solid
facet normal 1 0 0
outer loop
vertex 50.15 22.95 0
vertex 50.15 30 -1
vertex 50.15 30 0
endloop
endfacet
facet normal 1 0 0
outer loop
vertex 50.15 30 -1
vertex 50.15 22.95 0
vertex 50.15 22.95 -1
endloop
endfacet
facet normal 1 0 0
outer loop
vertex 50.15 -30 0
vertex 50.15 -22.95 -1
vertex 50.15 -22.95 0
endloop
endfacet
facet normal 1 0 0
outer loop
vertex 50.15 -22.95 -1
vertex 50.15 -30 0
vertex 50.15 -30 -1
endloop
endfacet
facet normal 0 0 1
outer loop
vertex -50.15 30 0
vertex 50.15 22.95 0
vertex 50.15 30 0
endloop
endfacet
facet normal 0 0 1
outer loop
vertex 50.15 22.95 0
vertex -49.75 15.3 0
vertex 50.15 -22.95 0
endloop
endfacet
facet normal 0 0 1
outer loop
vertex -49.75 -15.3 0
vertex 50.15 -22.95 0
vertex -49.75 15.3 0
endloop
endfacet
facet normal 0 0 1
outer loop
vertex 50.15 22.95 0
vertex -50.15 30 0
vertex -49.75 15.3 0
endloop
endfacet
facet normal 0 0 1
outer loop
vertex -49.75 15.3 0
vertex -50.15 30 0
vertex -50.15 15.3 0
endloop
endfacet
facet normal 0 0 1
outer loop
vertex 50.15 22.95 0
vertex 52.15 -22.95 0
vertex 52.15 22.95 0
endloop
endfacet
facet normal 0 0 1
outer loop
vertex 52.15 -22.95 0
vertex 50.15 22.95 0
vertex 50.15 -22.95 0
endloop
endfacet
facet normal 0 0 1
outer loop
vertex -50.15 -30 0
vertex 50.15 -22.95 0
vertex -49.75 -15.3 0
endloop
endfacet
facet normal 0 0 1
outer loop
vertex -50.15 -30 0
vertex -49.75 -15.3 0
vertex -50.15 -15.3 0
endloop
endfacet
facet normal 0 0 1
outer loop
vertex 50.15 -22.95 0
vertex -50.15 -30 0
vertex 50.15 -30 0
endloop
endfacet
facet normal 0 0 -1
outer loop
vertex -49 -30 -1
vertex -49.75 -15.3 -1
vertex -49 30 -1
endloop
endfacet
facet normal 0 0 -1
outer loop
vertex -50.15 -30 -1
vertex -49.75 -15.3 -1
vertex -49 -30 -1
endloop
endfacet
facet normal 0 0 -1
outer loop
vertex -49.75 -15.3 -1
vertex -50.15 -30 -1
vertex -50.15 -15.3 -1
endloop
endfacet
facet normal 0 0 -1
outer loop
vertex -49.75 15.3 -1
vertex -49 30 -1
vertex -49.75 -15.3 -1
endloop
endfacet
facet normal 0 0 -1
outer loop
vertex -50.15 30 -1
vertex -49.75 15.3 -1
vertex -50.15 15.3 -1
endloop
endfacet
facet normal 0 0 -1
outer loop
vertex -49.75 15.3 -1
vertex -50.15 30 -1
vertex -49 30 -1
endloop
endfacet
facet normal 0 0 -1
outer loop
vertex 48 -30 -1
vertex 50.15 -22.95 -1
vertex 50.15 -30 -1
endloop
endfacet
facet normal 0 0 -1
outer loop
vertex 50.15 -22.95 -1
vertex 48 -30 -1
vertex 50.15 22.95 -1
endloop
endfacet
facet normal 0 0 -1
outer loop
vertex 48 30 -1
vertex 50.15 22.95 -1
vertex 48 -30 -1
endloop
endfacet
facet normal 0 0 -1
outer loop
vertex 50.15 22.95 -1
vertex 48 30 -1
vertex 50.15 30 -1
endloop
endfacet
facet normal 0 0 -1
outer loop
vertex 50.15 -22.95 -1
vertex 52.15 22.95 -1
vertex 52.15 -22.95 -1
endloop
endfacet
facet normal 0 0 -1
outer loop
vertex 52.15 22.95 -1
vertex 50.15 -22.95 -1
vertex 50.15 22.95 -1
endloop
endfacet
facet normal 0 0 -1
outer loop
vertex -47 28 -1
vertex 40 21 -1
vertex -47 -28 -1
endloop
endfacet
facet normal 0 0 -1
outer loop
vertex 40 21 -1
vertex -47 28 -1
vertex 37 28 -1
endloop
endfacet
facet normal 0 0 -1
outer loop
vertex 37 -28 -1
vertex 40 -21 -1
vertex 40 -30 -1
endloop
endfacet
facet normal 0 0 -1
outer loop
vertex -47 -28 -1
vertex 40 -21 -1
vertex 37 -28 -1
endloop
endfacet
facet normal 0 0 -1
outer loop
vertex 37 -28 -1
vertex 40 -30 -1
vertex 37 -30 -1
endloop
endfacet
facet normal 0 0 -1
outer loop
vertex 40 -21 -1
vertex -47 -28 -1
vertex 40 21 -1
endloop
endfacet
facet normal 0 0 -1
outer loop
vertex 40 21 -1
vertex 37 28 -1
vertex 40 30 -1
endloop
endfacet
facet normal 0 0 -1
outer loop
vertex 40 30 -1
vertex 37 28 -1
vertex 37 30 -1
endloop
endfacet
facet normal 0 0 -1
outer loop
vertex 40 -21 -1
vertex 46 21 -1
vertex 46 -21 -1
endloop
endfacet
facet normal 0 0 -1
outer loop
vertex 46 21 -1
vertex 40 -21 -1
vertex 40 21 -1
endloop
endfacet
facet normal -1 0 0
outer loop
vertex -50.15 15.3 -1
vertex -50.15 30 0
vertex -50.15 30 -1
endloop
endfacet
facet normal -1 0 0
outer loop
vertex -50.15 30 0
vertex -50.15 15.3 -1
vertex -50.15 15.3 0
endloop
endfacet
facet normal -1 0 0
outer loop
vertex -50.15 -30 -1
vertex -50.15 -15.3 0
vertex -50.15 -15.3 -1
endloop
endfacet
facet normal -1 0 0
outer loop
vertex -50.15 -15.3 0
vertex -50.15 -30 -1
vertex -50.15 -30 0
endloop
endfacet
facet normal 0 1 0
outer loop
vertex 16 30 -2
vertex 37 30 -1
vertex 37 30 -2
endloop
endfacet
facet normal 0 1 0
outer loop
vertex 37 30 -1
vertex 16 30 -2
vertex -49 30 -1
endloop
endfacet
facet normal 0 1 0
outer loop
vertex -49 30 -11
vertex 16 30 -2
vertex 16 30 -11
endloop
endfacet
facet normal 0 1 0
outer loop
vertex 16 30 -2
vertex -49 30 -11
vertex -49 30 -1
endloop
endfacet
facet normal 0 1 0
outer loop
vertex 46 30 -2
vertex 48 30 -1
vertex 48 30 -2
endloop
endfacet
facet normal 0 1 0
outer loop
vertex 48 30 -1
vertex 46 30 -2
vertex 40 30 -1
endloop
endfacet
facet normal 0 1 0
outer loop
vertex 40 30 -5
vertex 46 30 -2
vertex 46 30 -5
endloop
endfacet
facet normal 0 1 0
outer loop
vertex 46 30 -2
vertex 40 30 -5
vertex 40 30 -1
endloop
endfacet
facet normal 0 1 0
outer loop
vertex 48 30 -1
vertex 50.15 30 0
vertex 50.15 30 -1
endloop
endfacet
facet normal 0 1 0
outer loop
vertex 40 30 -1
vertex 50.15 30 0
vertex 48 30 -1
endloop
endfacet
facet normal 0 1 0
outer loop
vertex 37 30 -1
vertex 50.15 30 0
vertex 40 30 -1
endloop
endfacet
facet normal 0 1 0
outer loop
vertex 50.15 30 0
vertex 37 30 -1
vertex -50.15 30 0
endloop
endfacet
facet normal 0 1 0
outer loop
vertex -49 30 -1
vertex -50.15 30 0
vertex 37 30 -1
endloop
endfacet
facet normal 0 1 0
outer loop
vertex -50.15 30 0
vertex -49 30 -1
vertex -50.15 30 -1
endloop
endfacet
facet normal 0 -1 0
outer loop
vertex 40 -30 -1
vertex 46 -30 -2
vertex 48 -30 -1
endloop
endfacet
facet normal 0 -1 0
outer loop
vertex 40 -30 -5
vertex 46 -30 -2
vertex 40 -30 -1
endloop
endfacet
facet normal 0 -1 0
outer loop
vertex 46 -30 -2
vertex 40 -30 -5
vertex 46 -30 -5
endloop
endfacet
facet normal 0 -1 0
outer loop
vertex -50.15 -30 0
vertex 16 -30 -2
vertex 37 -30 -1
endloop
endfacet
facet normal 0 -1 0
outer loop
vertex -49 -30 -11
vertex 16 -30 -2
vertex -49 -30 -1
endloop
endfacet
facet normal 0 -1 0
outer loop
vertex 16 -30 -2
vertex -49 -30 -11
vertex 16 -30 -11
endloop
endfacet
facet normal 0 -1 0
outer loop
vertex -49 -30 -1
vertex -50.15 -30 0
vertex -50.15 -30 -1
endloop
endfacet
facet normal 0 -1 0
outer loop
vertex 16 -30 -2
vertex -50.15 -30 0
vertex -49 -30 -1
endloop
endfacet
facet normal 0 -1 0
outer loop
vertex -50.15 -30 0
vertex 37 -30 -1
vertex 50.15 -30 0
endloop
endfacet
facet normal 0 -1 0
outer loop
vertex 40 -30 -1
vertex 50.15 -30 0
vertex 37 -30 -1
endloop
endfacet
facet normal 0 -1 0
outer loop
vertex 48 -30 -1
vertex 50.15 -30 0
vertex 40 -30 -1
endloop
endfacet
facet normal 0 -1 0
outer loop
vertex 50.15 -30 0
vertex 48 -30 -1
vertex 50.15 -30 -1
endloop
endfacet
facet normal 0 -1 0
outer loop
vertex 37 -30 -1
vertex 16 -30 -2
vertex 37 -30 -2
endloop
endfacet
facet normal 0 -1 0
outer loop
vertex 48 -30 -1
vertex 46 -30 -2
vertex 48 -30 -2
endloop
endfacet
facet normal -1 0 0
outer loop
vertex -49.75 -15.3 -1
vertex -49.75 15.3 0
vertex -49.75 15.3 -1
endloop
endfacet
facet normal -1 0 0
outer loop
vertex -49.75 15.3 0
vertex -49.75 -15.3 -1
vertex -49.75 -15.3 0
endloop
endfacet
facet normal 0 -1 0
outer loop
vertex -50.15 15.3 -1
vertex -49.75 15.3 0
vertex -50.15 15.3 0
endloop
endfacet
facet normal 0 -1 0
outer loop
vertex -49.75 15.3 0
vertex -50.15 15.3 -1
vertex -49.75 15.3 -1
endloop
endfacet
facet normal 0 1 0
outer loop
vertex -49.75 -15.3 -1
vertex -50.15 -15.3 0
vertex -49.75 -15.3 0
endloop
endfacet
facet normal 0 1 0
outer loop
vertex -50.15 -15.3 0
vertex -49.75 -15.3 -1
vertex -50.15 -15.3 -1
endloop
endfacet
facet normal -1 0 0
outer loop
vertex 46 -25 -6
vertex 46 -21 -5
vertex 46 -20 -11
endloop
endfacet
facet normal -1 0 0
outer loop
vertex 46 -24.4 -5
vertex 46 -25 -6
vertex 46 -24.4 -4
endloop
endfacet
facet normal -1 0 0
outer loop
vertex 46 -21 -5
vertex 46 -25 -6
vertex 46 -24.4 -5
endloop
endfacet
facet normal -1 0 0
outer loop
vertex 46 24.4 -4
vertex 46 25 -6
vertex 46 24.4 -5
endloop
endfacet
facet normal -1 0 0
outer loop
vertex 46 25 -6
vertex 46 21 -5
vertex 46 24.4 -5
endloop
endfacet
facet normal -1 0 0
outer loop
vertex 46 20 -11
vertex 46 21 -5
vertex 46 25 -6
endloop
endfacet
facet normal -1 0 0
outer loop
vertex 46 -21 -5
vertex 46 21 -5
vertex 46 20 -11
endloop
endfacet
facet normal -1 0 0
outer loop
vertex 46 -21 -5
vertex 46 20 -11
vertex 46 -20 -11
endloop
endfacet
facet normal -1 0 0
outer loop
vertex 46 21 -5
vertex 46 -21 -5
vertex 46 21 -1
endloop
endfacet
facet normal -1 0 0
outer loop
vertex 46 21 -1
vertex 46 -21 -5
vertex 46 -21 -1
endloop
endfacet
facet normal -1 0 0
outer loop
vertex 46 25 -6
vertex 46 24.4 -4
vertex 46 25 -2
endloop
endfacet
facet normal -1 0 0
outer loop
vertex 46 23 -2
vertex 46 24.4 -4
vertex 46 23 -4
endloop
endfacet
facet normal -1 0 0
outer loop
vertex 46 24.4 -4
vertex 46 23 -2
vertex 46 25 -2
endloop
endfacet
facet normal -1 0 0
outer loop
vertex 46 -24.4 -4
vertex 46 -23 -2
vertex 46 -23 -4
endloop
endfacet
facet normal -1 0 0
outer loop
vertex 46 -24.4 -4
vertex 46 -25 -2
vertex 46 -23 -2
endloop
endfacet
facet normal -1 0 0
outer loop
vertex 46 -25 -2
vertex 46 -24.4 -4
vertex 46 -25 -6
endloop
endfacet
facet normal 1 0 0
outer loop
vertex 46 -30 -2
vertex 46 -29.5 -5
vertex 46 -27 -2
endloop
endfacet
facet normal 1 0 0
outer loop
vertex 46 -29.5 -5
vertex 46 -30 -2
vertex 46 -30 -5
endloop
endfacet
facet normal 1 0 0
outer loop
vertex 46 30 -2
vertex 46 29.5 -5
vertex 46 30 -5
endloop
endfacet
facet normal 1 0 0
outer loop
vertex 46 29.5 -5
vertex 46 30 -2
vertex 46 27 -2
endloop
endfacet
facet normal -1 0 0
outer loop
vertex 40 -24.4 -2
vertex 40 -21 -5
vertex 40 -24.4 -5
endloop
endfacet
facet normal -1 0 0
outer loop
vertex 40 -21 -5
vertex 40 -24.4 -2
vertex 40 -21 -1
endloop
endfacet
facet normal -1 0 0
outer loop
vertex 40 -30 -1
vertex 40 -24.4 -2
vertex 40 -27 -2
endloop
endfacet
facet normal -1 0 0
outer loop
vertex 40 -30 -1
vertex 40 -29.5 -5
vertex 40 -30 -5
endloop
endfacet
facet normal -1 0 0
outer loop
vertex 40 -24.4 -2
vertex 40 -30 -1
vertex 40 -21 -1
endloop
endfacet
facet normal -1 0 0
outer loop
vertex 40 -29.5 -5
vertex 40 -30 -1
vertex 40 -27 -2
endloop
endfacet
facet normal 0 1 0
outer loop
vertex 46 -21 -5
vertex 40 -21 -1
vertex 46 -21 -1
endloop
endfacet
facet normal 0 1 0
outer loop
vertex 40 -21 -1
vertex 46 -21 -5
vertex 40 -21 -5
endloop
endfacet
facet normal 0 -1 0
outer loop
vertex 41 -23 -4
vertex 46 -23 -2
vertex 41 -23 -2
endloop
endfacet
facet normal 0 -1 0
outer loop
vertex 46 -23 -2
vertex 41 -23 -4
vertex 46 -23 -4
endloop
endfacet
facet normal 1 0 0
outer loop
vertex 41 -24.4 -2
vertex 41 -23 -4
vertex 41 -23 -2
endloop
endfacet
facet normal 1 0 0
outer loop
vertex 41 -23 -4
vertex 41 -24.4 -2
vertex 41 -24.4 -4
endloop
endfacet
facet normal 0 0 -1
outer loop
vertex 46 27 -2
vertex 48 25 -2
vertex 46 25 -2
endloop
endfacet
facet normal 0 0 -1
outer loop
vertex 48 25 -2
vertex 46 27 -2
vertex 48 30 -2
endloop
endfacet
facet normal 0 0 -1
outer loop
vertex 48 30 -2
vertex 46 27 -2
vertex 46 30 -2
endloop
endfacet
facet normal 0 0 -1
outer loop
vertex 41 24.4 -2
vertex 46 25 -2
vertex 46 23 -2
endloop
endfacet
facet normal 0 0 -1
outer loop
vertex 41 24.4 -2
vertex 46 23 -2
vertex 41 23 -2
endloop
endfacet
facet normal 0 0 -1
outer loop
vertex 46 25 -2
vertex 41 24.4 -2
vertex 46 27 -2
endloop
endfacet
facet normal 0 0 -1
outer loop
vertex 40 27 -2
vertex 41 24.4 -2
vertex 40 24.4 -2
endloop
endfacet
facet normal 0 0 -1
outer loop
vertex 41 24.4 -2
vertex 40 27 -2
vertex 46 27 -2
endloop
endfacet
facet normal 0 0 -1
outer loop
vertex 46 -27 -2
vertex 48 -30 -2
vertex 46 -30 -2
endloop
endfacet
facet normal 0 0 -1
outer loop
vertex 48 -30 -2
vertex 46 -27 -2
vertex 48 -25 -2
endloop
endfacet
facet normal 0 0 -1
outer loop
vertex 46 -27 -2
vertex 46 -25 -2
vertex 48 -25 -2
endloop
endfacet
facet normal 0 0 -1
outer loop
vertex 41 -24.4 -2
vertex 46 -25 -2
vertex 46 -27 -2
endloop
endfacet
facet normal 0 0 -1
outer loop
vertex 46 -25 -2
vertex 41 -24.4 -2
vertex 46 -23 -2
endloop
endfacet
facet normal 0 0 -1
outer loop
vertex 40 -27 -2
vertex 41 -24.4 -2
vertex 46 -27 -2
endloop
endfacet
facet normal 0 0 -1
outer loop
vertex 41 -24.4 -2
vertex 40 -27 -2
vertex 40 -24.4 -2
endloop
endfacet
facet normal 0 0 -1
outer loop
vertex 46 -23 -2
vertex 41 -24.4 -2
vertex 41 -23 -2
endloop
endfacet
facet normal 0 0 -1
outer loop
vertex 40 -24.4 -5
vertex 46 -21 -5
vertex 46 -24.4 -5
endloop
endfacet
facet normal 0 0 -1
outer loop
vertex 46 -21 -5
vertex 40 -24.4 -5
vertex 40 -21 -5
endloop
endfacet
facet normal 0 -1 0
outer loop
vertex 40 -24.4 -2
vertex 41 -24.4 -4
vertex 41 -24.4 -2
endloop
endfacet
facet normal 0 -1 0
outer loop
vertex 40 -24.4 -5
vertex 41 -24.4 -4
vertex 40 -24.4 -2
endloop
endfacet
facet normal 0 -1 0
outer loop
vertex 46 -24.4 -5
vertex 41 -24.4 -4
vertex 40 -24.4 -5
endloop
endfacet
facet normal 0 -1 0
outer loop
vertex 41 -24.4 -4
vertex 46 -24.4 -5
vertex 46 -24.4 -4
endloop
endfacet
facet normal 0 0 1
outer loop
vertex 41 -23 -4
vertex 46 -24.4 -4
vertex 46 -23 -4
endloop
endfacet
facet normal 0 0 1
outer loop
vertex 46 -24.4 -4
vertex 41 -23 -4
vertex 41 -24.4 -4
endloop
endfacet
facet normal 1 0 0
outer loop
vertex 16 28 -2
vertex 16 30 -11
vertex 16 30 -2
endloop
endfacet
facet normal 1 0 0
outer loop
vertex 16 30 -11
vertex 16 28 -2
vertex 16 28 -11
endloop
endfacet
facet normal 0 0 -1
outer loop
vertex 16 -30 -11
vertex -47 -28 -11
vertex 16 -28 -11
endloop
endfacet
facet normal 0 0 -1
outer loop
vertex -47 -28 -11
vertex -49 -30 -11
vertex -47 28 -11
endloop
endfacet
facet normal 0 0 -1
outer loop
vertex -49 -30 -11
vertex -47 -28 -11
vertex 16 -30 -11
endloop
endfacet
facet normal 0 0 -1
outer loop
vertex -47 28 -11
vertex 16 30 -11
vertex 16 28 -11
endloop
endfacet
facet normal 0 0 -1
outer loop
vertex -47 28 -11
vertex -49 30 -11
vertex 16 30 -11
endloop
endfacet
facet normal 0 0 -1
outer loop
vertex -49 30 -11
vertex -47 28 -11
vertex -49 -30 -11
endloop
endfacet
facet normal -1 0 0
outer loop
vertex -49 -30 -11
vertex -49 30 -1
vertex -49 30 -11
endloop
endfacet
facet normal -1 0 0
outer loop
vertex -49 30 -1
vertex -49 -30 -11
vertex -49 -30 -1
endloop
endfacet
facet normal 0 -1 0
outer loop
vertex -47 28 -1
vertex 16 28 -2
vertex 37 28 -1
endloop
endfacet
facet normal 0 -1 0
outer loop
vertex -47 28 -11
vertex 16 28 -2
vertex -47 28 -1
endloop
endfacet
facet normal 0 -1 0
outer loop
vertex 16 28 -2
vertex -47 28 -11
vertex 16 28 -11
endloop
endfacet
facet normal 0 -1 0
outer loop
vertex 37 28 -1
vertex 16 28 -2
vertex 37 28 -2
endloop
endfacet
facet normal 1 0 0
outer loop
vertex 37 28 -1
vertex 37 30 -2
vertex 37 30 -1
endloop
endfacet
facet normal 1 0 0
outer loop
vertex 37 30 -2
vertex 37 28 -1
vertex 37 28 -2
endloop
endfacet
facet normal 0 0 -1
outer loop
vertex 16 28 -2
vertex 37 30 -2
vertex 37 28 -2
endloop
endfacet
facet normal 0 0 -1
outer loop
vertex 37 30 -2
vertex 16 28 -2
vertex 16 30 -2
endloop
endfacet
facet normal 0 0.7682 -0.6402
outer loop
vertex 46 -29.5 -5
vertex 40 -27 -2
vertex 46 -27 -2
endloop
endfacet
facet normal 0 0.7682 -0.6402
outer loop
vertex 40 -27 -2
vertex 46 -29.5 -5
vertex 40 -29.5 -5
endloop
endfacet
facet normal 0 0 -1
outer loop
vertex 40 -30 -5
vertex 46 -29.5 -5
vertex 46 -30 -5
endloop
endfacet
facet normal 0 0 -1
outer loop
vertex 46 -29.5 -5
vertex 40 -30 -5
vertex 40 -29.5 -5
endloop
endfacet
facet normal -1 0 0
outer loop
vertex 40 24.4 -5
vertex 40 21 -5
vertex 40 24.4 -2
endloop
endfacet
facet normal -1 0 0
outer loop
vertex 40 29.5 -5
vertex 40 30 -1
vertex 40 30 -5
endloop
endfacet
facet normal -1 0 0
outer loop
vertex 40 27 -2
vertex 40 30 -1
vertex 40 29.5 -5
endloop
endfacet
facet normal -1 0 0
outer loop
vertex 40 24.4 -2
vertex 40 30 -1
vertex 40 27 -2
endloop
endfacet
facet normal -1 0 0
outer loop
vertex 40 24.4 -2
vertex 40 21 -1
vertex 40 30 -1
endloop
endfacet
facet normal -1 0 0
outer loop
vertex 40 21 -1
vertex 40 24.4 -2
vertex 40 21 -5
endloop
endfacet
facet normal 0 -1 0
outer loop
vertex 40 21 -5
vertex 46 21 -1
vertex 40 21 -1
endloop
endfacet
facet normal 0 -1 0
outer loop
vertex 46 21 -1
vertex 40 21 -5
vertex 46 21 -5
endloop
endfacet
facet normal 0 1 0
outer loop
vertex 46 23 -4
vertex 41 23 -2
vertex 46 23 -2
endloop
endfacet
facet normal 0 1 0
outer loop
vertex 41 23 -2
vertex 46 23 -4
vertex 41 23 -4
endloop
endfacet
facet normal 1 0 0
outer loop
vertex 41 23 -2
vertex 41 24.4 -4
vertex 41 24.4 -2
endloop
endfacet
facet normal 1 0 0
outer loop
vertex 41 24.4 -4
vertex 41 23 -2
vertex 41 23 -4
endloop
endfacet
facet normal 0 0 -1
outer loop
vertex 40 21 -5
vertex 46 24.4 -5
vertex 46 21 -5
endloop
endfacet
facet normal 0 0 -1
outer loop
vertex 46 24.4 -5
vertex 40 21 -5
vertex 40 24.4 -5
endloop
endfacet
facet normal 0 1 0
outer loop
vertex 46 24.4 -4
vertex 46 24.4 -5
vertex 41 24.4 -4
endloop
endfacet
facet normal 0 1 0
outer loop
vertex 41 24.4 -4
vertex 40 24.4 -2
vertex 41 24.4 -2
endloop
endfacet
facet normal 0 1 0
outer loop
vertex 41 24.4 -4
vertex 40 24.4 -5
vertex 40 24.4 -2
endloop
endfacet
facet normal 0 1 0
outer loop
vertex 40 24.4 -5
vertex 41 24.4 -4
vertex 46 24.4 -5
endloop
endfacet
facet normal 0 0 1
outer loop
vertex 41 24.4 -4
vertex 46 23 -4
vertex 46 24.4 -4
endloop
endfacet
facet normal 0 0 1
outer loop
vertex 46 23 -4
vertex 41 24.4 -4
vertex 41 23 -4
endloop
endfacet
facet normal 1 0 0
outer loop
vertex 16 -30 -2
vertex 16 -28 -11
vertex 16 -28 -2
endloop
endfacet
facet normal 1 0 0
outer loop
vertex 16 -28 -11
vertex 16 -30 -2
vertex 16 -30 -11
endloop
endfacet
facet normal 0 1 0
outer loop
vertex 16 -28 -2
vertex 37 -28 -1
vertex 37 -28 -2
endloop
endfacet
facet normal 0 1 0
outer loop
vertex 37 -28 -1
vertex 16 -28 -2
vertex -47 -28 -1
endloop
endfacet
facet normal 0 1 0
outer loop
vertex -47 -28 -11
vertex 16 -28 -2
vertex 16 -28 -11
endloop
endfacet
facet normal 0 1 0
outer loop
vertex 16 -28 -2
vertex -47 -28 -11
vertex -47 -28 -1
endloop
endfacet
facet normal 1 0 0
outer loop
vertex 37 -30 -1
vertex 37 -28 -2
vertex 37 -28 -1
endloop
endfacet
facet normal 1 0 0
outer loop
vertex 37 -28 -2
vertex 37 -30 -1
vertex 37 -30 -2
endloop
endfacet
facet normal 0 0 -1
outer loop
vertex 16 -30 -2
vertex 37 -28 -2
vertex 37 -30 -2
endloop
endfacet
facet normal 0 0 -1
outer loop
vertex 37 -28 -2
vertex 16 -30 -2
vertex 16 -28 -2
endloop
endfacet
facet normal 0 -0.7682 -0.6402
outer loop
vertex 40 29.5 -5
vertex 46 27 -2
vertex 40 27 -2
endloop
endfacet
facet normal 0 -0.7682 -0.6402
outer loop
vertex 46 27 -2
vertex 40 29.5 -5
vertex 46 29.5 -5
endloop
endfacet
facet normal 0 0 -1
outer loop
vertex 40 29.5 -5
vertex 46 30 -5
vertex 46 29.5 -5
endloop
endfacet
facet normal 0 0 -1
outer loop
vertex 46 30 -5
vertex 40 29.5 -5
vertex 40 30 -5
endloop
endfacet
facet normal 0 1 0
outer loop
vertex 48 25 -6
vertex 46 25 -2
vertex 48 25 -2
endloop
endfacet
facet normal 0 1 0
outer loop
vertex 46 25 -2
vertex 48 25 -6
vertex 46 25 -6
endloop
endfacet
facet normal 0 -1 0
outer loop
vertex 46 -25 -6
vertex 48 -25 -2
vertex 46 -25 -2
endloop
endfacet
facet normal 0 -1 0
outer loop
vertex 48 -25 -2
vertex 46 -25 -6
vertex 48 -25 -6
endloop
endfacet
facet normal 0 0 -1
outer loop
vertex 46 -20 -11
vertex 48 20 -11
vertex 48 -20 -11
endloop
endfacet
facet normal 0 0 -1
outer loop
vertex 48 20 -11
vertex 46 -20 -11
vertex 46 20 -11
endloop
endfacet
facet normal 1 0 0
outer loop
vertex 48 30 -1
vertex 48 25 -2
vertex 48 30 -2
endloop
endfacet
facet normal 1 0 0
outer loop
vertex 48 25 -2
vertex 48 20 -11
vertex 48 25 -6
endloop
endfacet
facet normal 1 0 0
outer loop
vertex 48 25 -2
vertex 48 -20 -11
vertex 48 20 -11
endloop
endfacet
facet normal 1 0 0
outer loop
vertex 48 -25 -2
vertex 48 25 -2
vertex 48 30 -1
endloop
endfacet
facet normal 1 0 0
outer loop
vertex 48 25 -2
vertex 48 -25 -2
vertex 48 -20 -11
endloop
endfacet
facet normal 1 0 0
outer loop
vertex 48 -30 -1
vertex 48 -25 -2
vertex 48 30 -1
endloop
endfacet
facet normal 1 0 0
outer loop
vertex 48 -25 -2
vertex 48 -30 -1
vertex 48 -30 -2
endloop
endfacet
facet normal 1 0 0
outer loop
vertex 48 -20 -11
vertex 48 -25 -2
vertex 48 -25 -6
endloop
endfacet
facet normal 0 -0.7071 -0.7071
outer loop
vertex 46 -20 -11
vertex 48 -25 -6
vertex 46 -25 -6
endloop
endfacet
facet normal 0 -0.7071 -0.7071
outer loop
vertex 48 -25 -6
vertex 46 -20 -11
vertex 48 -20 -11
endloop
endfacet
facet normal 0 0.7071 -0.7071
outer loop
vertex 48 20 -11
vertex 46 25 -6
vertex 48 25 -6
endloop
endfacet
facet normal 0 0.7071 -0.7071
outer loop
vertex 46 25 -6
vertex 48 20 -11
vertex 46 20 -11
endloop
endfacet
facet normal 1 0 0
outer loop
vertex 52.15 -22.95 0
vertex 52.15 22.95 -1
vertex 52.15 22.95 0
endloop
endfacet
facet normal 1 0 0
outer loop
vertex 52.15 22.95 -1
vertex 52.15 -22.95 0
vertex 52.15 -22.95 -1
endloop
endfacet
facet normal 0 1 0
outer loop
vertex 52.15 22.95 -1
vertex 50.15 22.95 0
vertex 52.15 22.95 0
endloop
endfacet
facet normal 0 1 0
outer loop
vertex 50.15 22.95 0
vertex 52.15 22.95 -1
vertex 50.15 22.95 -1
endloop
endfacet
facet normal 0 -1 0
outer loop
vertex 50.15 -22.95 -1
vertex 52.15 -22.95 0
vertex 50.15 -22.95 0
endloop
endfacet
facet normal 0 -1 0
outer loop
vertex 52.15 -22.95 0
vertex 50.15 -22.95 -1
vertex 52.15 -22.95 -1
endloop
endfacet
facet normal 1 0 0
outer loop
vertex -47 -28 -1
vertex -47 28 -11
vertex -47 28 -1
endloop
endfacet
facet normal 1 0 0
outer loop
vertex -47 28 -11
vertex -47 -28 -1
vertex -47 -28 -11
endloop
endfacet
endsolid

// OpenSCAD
module hidden_box_cup(payload) {
    difference() {
        translate([0, 0, -0.5])
        cube([payload.x + 0.3, payload.y, 1], true);
        
        translate([-payload.x / 2 - 0.5, 0, -1])
        cube([1.5, payload.y - 29.4, 3], true);
    }
    
    translate([payload.x / 2 - 2, 0, -2])
    rotate([-90, 0, 90])
    linear_extrude(2)
    polygon([
        [-payload.y / 2 + 5, 0], 
        [-payload.y / 2 + 5, 4],
        [-payload.y / 2 + 10, 9],
        [payload.y / 2 - 10, 9],
        [payload.y / 2 - 5, 4],
        [payload.y / 2 - 5, 0],
    ]);
        
    translate([payload.x / 2 - 3, 0, -1])
    cube([2, payload.y, 2], true);

    translate([payload.x / 2 + 1.1, 0, -0.5])
    cube([2.1, payload.y - 14.1, 1], true);
    
    translate([-payload.x / 2 + 2, 0, -6])
    cube([2, payload.y, 10], true);
    
    hidden_box_cup_right(payload);
    
    mirror([0, 1, 0])
    hidden_box_cup_right(payload);
}

module hidden_box_cup_right(payload) {
    translate([-payload.x / 2 + 1, payload.y / 2 - 2, -11])
    cube([payload.x - 35, 2, 10]);
    
    translate([-payload.x / 2 + 56, payload.y / 2 - 2, -2])
    cube([31, 2, 1]);
    
    translate([payload.x / 2 - 10, -payload.y / 2 + 6 , -5.5])
    floor_button_hook();
    
    translate([payload.x / 2 - 10, -payload.y / 2 , -2])
    rotate([0, 90, 0])
    linear_extrude(6)
    polygon([[0, 0], [3, 0], [3, 0.5], [0, 3]]);
    
    translate([payload.x / 2 - 10, -payload.y / 2, -2])
    cube([6, 7, 1]);
}

module floor_button_hook() {
    translate([0, 1, 1])
    cube([6, 2, 3.5]);
    
    translate([0, -0.4, 0.5])
    cube([1, 3, 3]);
    
    translate([0, -0.4, 0.5])
    cube([6, 3.4, 1]);
}


difference() {
    !hidden_box_cup([100, 60, 50]);
    
    translate([-35, -23, -2])
    cube([65, 46, 4]);
}
